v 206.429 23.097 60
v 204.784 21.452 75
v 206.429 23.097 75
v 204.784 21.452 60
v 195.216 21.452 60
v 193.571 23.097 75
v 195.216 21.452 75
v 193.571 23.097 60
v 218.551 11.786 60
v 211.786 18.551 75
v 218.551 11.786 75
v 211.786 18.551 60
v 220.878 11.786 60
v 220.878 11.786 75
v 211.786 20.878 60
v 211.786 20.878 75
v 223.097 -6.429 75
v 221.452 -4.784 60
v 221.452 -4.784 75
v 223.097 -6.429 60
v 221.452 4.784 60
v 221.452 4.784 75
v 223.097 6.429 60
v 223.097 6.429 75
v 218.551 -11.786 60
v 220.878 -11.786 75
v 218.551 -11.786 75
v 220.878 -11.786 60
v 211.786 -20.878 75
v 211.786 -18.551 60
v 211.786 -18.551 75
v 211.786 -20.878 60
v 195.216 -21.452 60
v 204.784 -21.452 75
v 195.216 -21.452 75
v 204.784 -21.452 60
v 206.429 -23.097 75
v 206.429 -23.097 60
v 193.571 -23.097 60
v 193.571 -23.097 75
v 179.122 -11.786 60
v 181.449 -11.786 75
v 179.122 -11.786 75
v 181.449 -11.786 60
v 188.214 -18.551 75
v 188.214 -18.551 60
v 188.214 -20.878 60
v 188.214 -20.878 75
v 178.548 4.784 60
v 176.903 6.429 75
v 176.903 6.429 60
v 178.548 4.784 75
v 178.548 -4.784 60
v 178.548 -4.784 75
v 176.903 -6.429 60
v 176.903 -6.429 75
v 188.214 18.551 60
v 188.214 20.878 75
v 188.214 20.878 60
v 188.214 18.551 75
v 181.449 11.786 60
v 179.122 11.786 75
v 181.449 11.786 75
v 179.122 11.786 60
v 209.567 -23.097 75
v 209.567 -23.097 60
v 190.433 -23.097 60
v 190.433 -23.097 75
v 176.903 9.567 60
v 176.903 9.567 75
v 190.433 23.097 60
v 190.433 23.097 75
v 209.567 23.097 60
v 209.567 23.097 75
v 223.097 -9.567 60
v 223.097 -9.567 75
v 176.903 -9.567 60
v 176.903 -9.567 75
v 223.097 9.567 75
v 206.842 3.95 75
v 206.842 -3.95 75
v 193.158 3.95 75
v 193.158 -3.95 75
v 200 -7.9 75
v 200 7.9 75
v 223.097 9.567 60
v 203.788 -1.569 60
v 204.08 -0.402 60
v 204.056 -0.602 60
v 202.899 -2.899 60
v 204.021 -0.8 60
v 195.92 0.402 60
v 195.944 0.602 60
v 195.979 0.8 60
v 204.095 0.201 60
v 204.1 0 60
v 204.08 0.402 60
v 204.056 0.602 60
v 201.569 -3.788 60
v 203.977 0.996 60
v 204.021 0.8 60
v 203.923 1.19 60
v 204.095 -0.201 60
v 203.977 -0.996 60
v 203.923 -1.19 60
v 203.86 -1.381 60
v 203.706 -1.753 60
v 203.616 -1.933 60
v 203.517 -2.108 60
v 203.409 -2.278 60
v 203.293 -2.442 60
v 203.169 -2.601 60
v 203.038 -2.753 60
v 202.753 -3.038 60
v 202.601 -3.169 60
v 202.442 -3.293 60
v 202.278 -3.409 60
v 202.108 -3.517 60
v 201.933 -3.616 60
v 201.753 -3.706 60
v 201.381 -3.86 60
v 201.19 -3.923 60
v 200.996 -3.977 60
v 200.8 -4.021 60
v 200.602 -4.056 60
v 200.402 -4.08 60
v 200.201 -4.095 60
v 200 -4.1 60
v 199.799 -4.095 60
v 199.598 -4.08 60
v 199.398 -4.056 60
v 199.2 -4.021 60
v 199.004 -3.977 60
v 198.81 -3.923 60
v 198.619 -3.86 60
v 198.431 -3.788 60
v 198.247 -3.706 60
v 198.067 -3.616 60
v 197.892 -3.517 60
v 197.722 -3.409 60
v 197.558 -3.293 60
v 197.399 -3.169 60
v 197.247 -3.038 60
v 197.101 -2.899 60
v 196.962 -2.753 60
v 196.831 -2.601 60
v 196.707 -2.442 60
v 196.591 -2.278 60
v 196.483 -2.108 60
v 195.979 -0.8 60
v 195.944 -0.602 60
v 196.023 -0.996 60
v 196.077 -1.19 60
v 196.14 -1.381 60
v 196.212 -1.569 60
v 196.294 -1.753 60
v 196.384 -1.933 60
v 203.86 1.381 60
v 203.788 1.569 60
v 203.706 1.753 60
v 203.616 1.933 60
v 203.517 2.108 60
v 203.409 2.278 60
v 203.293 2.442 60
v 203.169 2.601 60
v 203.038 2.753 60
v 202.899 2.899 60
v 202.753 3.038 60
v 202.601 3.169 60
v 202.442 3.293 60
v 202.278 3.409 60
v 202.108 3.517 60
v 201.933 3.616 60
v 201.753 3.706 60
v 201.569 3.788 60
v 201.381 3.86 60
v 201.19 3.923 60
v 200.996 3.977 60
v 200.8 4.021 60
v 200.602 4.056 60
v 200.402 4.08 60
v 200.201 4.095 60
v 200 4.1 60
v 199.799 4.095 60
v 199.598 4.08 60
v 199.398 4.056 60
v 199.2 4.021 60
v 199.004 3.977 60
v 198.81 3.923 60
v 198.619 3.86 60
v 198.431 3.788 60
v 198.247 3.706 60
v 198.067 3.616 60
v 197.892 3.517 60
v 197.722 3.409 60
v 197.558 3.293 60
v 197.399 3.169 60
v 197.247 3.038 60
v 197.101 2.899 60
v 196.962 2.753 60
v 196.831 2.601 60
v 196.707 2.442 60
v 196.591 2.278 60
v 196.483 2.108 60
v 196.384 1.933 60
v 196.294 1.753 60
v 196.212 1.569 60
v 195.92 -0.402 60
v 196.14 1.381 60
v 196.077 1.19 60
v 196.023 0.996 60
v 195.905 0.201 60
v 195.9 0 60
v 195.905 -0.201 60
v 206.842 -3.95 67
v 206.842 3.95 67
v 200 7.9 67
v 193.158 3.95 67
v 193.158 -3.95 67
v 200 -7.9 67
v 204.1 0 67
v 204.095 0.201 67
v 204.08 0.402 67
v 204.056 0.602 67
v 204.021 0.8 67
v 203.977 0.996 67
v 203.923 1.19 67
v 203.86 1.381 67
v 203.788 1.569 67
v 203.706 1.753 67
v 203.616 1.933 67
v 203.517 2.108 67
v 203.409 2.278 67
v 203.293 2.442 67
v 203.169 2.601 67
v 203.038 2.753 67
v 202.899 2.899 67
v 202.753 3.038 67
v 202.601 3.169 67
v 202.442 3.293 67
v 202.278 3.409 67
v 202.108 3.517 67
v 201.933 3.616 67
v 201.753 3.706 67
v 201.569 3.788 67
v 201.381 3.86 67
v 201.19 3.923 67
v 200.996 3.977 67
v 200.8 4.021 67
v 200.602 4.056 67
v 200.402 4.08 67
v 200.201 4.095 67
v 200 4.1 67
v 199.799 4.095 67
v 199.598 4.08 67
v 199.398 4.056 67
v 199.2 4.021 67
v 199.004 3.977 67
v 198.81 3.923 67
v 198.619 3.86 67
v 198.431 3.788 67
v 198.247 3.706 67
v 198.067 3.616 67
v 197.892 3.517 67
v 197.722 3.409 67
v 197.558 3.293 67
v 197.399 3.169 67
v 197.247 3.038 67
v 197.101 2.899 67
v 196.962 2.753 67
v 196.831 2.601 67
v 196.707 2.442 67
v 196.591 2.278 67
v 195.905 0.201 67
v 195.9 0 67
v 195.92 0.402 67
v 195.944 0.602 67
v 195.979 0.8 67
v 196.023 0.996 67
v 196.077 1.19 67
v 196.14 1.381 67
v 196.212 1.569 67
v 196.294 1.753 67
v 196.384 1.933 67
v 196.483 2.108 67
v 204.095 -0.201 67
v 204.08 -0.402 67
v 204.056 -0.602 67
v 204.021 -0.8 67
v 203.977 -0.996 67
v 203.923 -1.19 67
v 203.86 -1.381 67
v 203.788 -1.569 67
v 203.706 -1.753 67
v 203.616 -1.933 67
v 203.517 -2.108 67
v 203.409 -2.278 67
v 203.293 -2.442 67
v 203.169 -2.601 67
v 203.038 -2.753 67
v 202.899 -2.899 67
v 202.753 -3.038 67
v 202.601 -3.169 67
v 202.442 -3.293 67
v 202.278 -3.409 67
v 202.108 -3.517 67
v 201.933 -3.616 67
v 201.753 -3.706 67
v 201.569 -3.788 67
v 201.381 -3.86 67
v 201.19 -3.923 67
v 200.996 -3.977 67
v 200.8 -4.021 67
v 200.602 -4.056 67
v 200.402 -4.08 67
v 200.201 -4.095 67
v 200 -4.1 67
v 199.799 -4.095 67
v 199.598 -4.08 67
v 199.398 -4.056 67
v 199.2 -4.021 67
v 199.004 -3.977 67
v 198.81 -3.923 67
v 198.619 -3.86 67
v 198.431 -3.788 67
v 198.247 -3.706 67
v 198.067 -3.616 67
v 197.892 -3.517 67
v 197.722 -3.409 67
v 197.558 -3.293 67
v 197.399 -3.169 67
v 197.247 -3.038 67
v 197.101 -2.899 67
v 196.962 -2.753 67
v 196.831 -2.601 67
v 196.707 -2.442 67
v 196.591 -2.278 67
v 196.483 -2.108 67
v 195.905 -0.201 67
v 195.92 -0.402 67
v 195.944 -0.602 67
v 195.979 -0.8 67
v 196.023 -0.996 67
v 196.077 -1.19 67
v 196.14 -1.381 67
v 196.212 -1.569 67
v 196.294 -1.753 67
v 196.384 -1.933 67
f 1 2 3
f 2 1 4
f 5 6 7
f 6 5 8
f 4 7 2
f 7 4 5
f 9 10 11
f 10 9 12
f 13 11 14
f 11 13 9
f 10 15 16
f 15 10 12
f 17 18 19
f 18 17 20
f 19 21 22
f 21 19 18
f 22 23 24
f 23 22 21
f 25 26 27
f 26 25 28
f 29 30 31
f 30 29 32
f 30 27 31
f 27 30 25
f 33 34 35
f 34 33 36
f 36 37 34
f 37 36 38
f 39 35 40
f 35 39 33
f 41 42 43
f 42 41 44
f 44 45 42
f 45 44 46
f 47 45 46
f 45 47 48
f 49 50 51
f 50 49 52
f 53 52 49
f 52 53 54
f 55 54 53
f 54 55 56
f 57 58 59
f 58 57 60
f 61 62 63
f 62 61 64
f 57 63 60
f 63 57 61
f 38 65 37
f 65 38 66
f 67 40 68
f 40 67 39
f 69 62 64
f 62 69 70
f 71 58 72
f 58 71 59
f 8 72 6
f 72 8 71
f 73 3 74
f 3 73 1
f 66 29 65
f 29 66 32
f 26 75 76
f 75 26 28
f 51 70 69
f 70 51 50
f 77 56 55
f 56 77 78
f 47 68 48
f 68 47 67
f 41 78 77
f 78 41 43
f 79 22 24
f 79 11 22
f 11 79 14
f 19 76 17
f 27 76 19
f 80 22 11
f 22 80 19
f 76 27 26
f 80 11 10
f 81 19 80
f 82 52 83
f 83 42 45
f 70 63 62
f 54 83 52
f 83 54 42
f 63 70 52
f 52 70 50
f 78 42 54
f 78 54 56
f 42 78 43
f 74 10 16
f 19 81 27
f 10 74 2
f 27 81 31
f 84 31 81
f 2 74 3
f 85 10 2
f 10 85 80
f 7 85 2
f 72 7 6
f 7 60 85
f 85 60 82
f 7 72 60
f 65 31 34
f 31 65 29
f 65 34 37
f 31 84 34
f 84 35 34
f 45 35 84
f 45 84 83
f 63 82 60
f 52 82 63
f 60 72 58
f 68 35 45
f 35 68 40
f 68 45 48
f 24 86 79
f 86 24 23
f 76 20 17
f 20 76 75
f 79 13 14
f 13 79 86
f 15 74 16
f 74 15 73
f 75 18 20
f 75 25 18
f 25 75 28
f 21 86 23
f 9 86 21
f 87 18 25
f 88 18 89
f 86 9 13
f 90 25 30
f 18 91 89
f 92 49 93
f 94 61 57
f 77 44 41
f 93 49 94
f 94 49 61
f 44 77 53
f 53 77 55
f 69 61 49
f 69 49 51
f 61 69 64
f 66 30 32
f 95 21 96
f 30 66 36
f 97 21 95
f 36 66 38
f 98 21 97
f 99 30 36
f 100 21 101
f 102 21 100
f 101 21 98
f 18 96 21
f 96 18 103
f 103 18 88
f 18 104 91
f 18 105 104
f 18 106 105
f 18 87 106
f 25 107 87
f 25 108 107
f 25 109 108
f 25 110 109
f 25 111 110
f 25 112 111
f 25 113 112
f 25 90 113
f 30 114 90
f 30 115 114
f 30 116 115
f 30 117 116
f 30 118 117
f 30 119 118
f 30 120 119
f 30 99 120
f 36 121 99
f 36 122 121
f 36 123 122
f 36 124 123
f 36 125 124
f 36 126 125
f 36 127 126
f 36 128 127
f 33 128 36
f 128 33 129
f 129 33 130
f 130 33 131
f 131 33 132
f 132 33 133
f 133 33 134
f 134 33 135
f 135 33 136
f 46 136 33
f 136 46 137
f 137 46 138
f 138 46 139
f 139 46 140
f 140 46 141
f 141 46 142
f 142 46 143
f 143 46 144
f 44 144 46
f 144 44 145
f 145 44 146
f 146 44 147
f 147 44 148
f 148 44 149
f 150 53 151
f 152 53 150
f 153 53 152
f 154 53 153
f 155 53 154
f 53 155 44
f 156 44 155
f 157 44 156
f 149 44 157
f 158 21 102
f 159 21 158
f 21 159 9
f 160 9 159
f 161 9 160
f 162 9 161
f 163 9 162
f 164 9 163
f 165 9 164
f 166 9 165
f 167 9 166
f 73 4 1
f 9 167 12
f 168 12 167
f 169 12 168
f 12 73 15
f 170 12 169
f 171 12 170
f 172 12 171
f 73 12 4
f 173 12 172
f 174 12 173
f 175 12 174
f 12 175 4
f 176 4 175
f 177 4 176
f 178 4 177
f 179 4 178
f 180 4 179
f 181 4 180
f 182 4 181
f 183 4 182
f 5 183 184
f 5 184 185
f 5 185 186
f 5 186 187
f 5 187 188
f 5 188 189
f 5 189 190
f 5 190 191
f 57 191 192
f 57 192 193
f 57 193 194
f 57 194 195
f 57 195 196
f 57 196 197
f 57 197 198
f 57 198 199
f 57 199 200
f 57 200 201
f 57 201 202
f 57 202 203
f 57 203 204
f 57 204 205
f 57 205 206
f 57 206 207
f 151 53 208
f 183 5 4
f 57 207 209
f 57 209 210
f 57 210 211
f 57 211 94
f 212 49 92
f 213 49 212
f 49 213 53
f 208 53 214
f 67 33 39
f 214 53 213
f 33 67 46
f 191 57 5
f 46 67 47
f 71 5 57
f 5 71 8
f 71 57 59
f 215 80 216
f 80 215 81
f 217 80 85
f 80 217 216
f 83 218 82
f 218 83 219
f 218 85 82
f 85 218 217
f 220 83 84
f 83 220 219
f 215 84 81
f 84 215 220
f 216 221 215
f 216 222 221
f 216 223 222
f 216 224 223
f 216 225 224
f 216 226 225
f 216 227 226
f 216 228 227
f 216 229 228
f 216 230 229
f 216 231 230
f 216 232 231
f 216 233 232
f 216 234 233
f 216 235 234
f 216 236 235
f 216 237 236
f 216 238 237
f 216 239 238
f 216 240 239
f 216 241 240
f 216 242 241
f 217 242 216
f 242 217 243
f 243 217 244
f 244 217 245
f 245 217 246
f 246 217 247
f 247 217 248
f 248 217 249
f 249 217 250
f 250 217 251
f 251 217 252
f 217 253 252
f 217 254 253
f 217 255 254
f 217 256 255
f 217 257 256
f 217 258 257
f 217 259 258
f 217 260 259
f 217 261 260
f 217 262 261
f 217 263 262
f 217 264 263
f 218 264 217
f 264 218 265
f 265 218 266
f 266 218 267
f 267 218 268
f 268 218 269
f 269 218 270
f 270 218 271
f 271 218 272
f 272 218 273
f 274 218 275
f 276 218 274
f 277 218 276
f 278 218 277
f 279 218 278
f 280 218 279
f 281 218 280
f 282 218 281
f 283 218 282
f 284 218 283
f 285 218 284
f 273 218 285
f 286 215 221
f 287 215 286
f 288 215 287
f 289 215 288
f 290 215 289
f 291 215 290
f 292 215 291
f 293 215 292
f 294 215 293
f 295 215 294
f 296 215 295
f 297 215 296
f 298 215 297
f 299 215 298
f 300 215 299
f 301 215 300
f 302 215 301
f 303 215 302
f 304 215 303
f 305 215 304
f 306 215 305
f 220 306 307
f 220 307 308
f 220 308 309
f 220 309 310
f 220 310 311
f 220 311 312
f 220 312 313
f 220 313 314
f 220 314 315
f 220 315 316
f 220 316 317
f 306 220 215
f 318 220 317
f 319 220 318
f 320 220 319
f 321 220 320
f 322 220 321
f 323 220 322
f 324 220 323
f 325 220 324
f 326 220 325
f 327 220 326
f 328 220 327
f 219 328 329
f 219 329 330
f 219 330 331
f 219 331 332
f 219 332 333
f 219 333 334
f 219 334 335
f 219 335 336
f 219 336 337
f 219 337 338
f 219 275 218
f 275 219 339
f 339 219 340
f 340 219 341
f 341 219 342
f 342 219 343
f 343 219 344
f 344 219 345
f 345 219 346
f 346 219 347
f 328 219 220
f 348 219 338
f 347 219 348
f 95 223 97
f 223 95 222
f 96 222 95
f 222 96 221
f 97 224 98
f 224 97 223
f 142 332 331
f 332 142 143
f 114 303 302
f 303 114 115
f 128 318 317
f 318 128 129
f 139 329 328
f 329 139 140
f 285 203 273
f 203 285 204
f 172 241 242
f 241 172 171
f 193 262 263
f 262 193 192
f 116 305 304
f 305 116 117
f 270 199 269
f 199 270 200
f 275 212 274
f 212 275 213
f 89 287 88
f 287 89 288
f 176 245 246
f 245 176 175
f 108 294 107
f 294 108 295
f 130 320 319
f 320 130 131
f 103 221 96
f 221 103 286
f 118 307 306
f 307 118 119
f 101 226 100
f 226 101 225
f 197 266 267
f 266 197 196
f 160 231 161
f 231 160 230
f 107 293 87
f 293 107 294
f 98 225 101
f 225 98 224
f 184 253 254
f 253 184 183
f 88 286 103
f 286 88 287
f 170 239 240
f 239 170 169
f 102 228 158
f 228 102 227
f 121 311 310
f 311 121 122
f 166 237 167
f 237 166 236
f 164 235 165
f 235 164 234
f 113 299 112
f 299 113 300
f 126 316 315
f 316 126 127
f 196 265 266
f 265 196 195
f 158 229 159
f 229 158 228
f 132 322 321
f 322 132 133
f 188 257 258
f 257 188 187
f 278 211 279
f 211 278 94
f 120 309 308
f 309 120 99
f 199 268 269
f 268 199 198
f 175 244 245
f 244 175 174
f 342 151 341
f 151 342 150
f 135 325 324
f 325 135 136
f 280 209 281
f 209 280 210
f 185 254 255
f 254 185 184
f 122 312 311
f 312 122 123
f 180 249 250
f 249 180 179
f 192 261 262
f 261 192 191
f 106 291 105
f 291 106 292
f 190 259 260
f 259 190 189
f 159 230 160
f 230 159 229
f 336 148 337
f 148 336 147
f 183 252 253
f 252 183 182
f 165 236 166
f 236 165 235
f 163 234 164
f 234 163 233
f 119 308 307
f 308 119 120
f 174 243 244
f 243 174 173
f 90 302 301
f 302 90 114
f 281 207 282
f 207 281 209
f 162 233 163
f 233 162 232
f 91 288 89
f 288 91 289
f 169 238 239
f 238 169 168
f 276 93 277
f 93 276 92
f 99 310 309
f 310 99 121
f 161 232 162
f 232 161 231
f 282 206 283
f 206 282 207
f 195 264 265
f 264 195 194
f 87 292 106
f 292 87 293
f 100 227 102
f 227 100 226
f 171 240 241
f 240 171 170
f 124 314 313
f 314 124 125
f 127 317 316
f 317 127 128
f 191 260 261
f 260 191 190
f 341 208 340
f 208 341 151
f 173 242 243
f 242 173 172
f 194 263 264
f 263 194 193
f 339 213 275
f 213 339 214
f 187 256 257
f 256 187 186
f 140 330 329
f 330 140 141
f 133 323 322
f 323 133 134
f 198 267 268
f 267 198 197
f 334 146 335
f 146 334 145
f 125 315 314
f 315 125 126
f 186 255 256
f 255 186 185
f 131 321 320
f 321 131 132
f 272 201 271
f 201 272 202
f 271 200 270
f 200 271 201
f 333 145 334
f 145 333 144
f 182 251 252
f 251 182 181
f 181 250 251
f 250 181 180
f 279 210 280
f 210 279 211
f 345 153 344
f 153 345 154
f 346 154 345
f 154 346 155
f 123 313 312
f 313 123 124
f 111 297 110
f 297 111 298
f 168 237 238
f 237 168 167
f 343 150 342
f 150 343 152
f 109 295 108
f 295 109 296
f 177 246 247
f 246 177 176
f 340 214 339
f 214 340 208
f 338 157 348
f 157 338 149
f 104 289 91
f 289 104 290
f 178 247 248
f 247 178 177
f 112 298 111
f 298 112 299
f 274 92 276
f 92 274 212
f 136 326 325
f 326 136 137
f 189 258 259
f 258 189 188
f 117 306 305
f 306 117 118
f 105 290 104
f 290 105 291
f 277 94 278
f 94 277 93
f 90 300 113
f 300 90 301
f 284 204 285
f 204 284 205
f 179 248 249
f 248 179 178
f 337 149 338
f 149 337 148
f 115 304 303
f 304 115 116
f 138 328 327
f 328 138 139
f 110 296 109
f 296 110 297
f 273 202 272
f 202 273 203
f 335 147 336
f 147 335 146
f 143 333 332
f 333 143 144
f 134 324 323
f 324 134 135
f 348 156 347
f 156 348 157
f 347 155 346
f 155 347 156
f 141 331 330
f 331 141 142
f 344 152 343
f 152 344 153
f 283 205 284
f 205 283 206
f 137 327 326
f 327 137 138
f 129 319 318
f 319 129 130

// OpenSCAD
use <MCAD/teardrop.scad>;

// LED-bar light arm

$fn=128;

s=15;
r=25;
r_cutout = 200;

tolerance=0.3;

module flat_teardrop(radius, length, angle) {
    intersection() {
        rotate([0, angle, 0]) {
            cube(size=[radius * 2, radius * 2, length], center=true);
        }
        teardrop(radius, length, angle);
    }
}

module arm_piece_full(){
    difference(){
        hull(){
            cylinder(r=r, h=s);
            
            translate([200, 0, 0])
            cylinder(r=r, h=s, $fn=8);
        }
    }
} 

module arm_piece_half(thickness=s){
    difference(){
        hull(){
            rotate([0,0,1.5*360/8])
            cylinder(r=r, h=thickness, $fn=8);
            
            translate([100, 0, 0])
            rotate([0,0,1.5*360/8])
            cylinder(r=r, h=thickness, $fn=8);
        }        
    }
}

module arm_piece_quarter(thickness=s){
    difference(){
        hull(){
            rotate([0,0,1.5*360/8])
            cylinder(r=r, h=thickness, $fn=8);
            
            translate([50, 0, 0])
            rotate([0,0,1.5*360/8])
            cylinder(r=r, h=thickness, $fn=8);
        }        
    }
}

module arm(){
    difference(){
        union(){
            arm_piece_half(thickness=s-tolerance);

            translate([0, 0, 2*s])
            arm_piece_half(thickness=s-tolerance);
            
            translate([200, 0, s])
            rotate([0,0,180])
            arm_piece_half(thickness=s-tolerance);
            
            translate([200, 0, 3*s])
            rotate([0,0,180])
            arm_piece_half(thickness=s-tolerance);

            //connector
            translate([100, 0, 0])
            rotate([0,0,1.5*360/8])
            cylinder(r=r, h=5*s, $fn=8);
        }
        
        translate([0,0, 5*s/2])
        rotate([0, 90, 90])
        teardrop(4, 5*s+10, 90);
        
        translate([200,0, 5*s/2])
        rotate([0, 90, 90])
        teardrop(4, 5*s+10, 90);
        
        translate([0,0,-0.001])
        rotate([0,0,1.5*360/6])
        cylinder(r=7.9, h=7, $fn=6);
    }
    
    // cable-holder
    for(x=[-6, 100-6]){
        translate([x, r, 2.5*s-tolerance/2])
        difference(){
            rotate([0,90, 0])
            rotate([0, 0, 22.5])
            cylinder(r=(s-tolerance)/2, h=10, $fn=8);
            
            translate([-.5, 0, 0])
            rotate([0,90, 0])
            rotate([0, 0, 22.5])
            cylinder(r=(s-tolerance)/2-1.2, h=11, $fn=8);
        }
    }
}

module base(){
    
    difference(){
        union(){
            //arm_piece_half(thickness=s-tolerance);

            //translate([0, 0, 2*s])
            //arm_piece_half(thickness=s-tolerance);
            
            translate([200, 0, 2*s])
            rotate([0,0,180])
            arm_piece_quarter(thickness=s-tolerance);
            
            translate([200, 0, 4*s+tolerance])
            rotate([0,0,180])
            arm_piece_quarter(thickness=s-tolerance);

            //connector
            translate([150, 0, 0])
            rotate([0,0,1.5*360/8])
            cylinder(r=r, h=5*s, $fn=8);
            
            // halterung hinter pegboard
            translate([105, -33.5, 0])
            rotate([0, 0, 45])
            cube([50, 15, 5*s]);
        }
        
        // pegboard
        // halterung hinter pegboard
        translate([110.5, -36, -1])
        rotate([0, 0, 45])
        cube([40, 5.5, 5*s+2]);
        
        // wand-schraube
        for(z=[4.5*s, .5*s]){
            translate([140,10, z]){
            rotate([0, 0, -45]){
                flat_teardrop(2.7, 5*s+50, 90, $fn=128);
                translate([25,0,0])
                flat_teardrop(5.5, 60, 90, $fn=128);
                
                hull(){
                    translate([3, 0, 0])
                    flat_teardrop(5.5, 1, 90);
                    
                    translate([3-5.5, 0, 0])
                    flat_teardrop(2.7, 0.1, 90);
                }
            }
        }
        }
        
        // kabel-kanal
        translate([147, 30, 2.5*s])
        rotate([90, 0, -45])
        cylinder(r=10, h=100, $fn=6);
        
        // 8mm-löcher für schraube
        translate([0,0, 5*s/2])
        rotate([0, 90, 90])
        teardrop(4.5, 5*s+10, 90);
        
        translate([200,0, 5*s/2])
        rotate([0, 90, 90])
        teardrop(4.5, 5*s+10, 90);
        
        // muttern-falle
        #translate([200,0,5*s-7])
        rotate([0,0,1.5*360/6])
        cylinder(r=7.9, h=7, $fn=6);
    }
}

module beefygrip(){
    difference(){
        rotate([0,0,1.5*360/8])
        cylinder(r=r, h=s, $fn=8);
        
        // mutter
        translate([0,0,s-8])
        rotate([0,0,1.5*360/6])
        cylinder(r=7.9, h=8, $fn=6);
        
        
        // schraube
        translate([0, 0, -70+s-8])
        cylinder(r=4.1, h=70);
        
        // griffmulden
        for(angle=[0:360/8:360]){
            //translate([1.5*r-5, 0, -0.1])
            translate([sin(angle) * 1.5*(r-3), cos(angle)*1.5*(r-3), -0.1])
            rotate([0,0,22.5])
            cylinder(r=r/2, h=30, $fn=8);
        }
    }
}

if(false){
    base();
}

if(true){
    translate([200, 0, 4*s])
    beefygrip();
}

if(false){
    color("gray")
    arm();
}

if(false){
    translate([200, 0, 0])
    rotate([0, 0, 0])
    arm();

    translate([400, 0, 0])
    rotate([0, 0, 0])
    arm();
}
